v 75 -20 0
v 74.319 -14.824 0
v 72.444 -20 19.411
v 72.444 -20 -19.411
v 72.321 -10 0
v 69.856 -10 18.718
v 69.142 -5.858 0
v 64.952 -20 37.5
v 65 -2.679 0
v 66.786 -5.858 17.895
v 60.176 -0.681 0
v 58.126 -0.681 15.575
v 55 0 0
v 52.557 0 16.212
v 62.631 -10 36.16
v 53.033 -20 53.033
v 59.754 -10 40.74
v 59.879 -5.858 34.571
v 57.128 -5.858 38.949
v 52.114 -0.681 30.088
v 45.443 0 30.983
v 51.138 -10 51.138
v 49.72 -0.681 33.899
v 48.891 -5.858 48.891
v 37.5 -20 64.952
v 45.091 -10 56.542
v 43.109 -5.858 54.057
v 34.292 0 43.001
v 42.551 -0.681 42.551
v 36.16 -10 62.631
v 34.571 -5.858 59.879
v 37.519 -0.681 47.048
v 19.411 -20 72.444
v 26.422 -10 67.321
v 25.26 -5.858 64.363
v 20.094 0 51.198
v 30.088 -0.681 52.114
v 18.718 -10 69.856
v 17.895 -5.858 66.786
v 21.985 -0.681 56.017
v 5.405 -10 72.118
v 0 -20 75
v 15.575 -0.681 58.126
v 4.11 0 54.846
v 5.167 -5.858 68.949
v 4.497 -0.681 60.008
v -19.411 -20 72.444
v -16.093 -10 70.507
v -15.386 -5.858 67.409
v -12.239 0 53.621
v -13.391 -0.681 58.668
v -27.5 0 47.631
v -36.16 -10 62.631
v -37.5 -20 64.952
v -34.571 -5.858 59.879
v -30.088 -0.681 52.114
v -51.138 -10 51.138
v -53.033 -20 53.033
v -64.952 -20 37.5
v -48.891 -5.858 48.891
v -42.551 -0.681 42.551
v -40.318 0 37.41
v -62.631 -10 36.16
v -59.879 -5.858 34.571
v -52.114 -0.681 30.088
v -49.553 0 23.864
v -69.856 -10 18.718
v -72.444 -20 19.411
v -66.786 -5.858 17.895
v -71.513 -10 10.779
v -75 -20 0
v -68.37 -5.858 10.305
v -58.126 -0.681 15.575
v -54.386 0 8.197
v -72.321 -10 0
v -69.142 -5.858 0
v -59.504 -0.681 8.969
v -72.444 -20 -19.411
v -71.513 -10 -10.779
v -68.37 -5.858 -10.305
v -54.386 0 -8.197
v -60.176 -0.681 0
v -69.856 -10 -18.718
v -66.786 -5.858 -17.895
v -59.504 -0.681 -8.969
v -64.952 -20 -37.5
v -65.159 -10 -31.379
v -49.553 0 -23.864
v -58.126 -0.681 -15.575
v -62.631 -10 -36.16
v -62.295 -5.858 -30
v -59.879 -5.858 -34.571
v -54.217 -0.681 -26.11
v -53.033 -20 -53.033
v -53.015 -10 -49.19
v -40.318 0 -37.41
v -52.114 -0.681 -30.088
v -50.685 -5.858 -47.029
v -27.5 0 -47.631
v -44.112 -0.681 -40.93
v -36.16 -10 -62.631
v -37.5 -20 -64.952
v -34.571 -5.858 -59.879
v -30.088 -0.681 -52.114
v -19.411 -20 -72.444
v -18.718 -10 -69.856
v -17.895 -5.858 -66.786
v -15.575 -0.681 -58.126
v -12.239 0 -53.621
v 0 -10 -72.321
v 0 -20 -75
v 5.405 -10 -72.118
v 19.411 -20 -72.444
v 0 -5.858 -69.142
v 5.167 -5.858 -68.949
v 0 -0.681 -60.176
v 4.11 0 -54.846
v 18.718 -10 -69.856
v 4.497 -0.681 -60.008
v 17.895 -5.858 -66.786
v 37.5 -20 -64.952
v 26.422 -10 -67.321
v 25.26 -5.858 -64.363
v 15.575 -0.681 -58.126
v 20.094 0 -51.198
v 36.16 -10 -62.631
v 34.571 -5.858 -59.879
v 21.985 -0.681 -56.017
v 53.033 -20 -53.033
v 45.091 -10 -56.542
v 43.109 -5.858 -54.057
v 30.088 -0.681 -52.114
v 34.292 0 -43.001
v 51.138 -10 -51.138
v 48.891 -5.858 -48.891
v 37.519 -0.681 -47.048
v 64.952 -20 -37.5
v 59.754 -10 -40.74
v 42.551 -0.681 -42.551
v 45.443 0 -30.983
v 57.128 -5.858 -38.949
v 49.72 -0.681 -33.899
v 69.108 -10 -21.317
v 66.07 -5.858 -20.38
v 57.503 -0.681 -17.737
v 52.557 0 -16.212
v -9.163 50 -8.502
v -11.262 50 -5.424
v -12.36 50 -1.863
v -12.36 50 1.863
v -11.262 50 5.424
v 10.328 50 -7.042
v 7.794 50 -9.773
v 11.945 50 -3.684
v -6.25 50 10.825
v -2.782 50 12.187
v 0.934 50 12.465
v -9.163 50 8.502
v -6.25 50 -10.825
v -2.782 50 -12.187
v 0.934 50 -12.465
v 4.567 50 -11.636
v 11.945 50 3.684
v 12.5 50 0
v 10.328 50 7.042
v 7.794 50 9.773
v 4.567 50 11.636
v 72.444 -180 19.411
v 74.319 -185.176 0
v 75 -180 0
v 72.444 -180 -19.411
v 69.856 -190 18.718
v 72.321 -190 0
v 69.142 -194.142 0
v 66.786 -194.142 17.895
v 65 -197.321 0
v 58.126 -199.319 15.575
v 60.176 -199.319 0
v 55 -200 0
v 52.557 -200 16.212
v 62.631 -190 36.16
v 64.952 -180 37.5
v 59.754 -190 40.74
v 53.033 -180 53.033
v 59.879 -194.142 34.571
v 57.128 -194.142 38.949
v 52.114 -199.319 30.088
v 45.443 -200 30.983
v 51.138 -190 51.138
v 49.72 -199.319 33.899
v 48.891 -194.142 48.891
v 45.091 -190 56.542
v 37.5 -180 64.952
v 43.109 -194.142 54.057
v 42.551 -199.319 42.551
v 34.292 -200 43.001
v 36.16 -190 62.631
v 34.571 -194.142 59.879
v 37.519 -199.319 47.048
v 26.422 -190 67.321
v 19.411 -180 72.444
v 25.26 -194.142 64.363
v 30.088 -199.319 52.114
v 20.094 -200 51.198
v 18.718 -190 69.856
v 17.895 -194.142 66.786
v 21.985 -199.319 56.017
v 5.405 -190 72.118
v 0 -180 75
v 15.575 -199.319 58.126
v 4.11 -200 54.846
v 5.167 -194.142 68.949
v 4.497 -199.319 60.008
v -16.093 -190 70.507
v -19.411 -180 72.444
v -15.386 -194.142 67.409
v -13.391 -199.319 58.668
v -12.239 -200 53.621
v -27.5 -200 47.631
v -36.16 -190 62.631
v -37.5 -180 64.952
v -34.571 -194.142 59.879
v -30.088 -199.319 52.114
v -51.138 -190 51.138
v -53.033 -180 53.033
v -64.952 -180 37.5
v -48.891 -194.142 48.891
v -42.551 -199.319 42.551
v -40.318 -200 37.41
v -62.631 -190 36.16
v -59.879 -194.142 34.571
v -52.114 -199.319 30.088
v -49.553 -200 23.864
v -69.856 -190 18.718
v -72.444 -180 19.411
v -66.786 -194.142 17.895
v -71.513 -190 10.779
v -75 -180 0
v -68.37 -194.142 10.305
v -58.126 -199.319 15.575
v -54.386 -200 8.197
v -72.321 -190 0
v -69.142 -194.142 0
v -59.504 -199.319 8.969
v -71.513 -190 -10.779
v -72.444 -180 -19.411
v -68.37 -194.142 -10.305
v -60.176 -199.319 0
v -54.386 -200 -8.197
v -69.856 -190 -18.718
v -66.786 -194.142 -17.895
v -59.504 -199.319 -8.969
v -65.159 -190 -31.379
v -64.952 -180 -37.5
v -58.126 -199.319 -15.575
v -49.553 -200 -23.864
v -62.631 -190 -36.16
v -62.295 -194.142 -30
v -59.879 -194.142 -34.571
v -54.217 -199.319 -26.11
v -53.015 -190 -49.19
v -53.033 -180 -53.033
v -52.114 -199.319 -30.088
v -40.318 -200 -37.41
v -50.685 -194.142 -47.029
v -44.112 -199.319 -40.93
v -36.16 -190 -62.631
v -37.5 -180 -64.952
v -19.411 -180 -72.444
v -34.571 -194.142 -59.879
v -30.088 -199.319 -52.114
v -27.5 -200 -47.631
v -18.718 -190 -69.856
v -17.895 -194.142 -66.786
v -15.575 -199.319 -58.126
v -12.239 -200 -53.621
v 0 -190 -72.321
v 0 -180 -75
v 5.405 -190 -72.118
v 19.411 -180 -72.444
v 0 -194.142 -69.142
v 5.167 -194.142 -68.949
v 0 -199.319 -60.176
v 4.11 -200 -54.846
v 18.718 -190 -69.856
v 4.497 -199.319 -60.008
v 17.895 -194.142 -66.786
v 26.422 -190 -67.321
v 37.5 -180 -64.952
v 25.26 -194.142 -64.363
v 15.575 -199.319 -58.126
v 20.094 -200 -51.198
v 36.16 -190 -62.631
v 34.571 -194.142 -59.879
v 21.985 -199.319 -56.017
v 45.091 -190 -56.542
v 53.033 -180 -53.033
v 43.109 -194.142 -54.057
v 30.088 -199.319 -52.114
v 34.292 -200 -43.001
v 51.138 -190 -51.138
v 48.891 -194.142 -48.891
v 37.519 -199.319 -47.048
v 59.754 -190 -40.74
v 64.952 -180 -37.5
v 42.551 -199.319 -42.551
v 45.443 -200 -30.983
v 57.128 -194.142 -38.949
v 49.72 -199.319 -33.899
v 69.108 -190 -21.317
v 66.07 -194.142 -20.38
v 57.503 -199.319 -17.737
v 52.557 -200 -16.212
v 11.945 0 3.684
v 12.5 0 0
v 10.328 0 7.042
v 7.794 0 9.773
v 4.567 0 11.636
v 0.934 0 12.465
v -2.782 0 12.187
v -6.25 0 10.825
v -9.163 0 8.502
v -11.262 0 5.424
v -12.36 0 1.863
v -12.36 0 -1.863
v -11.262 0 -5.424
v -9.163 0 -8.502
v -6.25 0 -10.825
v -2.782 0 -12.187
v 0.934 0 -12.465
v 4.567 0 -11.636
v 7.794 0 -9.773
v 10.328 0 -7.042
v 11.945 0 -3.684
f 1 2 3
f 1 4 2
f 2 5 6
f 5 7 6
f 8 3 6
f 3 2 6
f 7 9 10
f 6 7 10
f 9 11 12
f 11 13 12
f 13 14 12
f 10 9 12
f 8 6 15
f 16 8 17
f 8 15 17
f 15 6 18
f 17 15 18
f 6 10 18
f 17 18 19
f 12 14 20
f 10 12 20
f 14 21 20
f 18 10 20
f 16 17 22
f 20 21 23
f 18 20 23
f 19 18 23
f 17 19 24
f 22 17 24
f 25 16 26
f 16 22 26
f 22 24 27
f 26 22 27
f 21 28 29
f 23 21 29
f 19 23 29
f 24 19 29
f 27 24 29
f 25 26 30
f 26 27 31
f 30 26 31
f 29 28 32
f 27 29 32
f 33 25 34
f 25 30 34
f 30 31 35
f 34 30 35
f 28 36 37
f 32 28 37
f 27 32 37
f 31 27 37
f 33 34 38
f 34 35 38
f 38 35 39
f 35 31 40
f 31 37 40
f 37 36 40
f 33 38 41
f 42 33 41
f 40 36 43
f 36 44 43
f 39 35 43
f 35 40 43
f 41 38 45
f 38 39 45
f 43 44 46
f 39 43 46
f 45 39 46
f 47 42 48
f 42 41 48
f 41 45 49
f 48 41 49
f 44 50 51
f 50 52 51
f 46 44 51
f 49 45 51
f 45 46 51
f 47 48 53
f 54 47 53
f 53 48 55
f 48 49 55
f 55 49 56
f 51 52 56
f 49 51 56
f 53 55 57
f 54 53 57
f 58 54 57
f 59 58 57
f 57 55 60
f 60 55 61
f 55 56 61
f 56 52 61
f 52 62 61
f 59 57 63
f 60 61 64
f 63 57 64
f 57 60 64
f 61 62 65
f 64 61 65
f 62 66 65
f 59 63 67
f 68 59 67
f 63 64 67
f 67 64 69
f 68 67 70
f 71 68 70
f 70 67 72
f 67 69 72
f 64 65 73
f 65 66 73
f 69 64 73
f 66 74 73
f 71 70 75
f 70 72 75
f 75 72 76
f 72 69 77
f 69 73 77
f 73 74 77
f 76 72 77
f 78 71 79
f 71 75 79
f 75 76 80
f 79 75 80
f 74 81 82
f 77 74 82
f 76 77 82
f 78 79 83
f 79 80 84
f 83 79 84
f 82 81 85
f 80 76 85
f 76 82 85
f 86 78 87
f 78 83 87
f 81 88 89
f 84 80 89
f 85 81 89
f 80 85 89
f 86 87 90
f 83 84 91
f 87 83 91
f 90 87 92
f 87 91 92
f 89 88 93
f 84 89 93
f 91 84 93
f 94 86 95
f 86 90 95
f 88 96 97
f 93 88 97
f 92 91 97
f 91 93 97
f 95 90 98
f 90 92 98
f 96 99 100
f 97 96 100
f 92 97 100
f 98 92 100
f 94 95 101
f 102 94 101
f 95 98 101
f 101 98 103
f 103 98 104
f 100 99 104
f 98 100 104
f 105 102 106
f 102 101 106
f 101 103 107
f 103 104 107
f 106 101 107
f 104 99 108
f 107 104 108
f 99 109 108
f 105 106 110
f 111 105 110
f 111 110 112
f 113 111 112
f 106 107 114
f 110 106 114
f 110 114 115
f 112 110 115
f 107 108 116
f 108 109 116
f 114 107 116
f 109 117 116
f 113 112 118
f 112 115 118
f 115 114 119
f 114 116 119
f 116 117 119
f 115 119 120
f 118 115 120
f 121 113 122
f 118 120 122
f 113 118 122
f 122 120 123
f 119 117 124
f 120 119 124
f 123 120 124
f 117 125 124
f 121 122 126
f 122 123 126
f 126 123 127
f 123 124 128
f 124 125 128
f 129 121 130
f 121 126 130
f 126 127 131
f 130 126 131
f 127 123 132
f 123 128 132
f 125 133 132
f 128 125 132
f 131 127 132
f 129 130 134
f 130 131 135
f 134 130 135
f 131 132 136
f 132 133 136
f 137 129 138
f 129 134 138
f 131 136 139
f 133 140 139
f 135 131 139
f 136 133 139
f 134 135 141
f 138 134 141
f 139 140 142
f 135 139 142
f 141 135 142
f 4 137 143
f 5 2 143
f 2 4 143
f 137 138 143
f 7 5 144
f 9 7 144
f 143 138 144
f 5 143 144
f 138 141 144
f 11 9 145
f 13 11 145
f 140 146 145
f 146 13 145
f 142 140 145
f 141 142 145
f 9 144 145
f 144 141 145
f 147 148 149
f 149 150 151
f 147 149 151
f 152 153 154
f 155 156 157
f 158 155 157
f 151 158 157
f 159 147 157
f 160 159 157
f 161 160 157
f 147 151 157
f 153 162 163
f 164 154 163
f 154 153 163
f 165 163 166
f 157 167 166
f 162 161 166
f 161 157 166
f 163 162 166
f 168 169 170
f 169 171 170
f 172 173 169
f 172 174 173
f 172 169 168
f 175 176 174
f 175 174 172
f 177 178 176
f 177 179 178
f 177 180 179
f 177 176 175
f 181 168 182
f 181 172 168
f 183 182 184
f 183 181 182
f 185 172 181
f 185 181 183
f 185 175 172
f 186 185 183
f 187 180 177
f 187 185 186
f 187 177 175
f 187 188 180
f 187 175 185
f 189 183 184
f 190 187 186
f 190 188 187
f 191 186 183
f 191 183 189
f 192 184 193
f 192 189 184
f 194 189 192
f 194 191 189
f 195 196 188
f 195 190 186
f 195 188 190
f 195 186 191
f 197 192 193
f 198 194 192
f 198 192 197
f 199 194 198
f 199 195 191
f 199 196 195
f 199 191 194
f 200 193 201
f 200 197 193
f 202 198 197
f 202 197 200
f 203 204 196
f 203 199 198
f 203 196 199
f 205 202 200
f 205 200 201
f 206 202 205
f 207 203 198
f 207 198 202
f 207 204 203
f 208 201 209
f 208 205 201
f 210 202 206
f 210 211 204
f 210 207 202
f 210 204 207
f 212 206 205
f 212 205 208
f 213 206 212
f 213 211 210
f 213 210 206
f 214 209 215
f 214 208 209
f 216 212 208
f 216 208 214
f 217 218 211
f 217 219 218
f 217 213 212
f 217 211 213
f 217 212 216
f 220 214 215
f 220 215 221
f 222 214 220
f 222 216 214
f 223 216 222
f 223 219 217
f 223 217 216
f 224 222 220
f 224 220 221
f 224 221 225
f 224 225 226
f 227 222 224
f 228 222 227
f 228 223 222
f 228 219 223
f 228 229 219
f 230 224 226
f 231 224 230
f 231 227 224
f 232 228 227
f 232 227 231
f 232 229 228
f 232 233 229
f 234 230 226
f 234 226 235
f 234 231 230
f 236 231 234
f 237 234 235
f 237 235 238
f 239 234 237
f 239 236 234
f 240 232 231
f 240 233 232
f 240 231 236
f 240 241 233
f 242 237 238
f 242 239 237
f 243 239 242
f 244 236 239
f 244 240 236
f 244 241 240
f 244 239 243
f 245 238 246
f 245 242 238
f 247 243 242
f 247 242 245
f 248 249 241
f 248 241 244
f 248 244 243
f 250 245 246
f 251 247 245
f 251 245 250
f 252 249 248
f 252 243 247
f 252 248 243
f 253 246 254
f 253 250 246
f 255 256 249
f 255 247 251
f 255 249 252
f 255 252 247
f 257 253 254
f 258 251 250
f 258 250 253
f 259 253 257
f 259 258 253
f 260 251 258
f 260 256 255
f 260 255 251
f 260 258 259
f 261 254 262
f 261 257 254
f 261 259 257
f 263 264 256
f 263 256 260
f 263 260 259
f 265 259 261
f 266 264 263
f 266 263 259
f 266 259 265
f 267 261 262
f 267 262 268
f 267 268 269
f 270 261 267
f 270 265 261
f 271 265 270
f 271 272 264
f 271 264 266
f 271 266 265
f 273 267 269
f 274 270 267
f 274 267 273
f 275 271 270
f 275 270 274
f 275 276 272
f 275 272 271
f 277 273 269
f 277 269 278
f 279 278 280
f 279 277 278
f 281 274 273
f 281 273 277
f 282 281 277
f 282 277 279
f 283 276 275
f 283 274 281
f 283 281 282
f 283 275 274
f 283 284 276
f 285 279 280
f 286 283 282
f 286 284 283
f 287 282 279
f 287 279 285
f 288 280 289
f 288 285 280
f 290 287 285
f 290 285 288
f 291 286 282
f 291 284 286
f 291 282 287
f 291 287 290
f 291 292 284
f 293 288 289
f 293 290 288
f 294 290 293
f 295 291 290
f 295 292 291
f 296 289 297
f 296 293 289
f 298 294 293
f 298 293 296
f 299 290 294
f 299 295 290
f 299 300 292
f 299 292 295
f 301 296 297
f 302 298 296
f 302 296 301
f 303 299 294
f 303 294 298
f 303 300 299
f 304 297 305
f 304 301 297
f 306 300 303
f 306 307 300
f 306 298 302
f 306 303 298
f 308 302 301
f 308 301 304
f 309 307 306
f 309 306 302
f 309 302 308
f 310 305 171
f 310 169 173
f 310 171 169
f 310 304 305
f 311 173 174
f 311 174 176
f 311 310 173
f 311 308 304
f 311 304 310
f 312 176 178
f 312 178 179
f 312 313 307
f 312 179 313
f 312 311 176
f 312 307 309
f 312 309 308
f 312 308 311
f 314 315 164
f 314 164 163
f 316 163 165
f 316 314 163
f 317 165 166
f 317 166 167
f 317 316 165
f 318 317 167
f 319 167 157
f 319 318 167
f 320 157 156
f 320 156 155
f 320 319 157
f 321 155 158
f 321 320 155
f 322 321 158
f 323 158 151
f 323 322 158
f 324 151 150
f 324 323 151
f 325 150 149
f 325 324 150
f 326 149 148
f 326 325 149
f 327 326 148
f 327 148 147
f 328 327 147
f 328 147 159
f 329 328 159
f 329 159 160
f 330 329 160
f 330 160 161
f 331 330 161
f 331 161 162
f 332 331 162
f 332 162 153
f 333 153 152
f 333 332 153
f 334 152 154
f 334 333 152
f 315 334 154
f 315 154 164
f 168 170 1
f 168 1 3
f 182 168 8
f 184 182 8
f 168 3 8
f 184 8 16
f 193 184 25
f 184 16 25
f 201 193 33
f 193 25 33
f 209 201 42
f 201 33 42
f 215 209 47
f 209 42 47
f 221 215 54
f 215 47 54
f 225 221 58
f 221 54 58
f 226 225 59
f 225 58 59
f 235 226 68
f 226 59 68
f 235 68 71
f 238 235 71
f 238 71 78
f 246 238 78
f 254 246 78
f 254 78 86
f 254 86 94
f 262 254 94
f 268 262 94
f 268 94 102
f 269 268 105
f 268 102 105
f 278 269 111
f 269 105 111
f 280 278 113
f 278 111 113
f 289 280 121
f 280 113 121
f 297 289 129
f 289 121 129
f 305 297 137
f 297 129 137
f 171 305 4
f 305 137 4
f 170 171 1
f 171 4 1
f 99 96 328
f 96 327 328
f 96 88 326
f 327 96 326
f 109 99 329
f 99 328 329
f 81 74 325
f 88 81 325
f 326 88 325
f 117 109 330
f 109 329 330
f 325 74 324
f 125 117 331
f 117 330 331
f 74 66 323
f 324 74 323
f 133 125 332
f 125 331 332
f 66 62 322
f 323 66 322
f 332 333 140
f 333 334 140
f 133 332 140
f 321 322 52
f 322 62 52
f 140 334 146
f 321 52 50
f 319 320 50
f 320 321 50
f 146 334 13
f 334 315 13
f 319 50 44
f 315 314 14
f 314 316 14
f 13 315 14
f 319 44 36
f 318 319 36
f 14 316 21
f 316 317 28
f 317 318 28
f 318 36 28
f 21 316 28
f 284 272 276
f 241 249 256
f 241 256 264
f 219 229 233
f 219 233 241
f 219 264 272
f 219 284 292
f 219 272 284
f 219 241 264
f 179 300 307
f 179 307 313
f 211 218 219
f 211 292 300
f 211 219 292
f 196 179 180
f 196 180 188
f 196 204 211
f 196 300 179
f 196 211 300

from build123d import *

# Parameters (mm, degrees)
SKETCH_R     = 75
PAD_DEPTH    = 200
SKETCH001_R  = 12.5
PAD001_DEPTH = 50
FILLET_R     = 20
FILLET001_R  = 20


with BuildPart() as part:
    # Sketch → Pad (new body)
    with BuildSketch(Plane.XZ):
        Circle(SKETCH_R)
    extrude(amount=PAD_DEPTH)

    # Sketch001 → Pad001 (join)
    with BuildSketch(Plane.XZ):
        Circle(SKETCH001_R)
    extrude(amount=-PAD001_DEPTH)

    # Fillet
    fillet_edges = [part.edges().sort_by_distance(p)[0] for p in [
        (-75, 0, 0),
    ]]
    fillet(fillet_edges, radius=FILLET_R)

    # Fillet001
    fillet001_edges = [part.edges().sort_by_distance(p)[0] for p in [
        (-75, -200, 0),
    ]]
    fillet(fillet001_edges, radius=FILLET001_R)


solid = part.part
